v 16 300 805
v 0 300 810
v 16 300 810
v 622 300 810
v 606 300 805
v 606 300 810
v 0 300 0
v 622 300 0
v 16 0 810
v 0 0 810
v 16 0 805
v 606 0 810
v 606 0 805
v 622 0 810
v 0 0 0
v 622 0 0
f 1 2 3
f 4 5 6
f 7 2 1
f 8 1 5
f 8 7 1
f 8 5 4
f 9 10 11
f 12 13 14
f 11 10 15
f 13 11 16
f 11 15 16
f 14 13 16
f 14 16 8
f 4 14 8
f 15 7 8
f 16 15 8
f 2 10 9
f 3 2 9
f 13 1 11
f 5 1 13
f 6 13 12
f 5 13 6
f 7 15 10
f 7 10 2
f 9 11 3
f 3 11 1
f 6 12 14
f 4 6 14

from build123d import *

# Parameters (mm, degrees)
CUBE001_W     = 16
CUBE001_H     = 300
CUBE001_DEPTH = 810
CUBE002_W     = 590
CUBE002_H     = 300
CUBE002_DEPTH = 16
CUBE003_W     = 590
CUBE003_H     = 300
CUBE003_DEPTH = 789
CUBE_W        = 16
CUBE_H        = 300
CUBE_DEPTH    = 810


with BuildPart() as cube001:
    # cube001 → cube001 (new body)
    with BuildSketch(Plane(origin=(606, 0, 0), x_dir=(1, 0, 0), z_dir=(0, 0, 1))):
        with Locations((8, 150)):
            Rectangle(CUBE001_W, CUBE001_H)
    extrude(amount=CUBE001_DEPTH)


with BuildPart() as cube002:
    # cube002 → cube002 (new body)
    with BuildSketch(Plane(origin=(16, 0, 789), x_dir=(1, 0, 0), z_dir=(0, 0, 1))):
        with Locations((295, 150)):
            Rectangle(CUBE002_W, CUBE002_H)
    extrude(amount=CUBE002_DEPTH)


with BuildPart() as cube003:
    # cube003 → cube003 (new body)
    with BuildSketch(Plane(origin=(16, 0, 0), x_dir=(1, 0, 0), z_dir=(0, 0, 1))):
        with Locations((295, 150)):
            Rectangle(CUBE003_W, CUBE003_H)
    extrude(amount=CUBE003_DEPTH)


with BuildPart() as base_drawers:
    # cube → cube (new body)
    with BuildSketch(Plane.XY):
        with Locations((8, 150)):
            Rectangle(CUBE_W, CUBE_H)
    extrude(amount=CUBE_DEPTH)

    # Group: union cube001, cube002, cube003
    add(cube001.part)
    add(cube002.part)
    add(cube003.part)


solid = base_drawers.part
